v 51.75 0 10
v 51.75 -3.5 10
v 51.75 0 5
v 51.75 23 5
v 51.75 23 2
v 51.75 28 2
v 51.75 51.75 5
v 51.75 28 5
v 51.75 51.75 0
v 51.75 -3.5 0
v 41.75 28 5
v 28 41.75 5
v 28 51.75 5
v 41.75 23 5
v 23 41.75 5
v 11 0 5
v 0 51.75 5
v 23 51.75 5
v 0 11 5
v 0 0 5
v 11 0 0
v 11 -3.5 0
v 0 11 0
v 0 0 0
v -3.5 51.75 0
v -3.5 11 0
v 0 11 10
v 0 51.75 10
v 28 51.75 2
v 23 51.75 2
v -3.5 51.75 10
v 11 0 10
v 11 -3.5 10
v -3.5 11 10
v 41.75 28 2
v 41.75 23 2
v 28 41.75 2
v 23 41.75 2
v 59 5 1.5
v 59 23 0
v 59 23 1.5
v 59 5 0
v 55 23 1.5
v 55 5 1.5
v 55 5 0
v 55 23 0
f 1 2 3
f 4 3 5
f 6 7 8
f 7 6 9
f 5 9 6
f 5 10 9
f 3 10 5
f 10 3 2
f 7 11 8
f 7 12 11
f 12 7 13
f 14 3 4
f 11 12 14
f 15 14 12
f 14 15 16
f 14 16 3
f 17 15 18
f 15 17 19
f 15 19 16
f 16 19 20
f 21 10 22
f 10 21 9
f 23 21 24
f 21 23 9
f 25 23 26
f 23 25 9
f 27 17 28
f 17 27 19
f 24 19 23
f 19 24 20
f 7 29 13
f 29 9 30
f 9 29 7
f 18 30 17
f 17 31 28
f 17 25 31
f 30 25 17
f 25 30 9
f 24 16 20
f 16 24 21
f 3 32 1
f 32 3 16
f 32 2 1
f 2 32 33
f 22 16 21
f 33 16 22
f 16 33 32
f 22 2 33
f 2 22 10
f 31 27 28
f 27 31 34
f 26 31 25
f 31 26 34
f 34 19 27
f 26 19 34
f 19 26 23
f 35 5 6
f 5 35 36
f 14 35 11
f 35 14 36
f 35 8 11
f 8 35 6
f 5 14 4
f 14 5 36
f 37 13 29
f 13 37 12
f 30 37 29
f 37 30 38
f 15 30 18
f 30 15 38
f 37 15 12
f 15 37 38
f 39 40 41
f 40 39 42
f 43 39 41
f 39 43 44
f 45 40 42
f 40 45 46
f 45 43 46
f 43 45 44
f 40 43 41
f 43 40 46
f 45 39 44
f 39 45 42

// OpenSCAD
difference ()
{
	union()
	{
	translate ([0,0,0]) cube ([51.75, 51.75, 5]);
	translate ([11,0-3.5]) cube ([40.75,3.5,10]);
	translate ([-3.5,11,0]) cube ([3.5,40.75,10]);
	}
	translate ([41.75,23,2]) cube ([10,5,3]);
	translate ([23,41.75,2]) cube ([5,10,3]);
}
	translate ([55,5,0]) cube ([4,18,1.5]);
